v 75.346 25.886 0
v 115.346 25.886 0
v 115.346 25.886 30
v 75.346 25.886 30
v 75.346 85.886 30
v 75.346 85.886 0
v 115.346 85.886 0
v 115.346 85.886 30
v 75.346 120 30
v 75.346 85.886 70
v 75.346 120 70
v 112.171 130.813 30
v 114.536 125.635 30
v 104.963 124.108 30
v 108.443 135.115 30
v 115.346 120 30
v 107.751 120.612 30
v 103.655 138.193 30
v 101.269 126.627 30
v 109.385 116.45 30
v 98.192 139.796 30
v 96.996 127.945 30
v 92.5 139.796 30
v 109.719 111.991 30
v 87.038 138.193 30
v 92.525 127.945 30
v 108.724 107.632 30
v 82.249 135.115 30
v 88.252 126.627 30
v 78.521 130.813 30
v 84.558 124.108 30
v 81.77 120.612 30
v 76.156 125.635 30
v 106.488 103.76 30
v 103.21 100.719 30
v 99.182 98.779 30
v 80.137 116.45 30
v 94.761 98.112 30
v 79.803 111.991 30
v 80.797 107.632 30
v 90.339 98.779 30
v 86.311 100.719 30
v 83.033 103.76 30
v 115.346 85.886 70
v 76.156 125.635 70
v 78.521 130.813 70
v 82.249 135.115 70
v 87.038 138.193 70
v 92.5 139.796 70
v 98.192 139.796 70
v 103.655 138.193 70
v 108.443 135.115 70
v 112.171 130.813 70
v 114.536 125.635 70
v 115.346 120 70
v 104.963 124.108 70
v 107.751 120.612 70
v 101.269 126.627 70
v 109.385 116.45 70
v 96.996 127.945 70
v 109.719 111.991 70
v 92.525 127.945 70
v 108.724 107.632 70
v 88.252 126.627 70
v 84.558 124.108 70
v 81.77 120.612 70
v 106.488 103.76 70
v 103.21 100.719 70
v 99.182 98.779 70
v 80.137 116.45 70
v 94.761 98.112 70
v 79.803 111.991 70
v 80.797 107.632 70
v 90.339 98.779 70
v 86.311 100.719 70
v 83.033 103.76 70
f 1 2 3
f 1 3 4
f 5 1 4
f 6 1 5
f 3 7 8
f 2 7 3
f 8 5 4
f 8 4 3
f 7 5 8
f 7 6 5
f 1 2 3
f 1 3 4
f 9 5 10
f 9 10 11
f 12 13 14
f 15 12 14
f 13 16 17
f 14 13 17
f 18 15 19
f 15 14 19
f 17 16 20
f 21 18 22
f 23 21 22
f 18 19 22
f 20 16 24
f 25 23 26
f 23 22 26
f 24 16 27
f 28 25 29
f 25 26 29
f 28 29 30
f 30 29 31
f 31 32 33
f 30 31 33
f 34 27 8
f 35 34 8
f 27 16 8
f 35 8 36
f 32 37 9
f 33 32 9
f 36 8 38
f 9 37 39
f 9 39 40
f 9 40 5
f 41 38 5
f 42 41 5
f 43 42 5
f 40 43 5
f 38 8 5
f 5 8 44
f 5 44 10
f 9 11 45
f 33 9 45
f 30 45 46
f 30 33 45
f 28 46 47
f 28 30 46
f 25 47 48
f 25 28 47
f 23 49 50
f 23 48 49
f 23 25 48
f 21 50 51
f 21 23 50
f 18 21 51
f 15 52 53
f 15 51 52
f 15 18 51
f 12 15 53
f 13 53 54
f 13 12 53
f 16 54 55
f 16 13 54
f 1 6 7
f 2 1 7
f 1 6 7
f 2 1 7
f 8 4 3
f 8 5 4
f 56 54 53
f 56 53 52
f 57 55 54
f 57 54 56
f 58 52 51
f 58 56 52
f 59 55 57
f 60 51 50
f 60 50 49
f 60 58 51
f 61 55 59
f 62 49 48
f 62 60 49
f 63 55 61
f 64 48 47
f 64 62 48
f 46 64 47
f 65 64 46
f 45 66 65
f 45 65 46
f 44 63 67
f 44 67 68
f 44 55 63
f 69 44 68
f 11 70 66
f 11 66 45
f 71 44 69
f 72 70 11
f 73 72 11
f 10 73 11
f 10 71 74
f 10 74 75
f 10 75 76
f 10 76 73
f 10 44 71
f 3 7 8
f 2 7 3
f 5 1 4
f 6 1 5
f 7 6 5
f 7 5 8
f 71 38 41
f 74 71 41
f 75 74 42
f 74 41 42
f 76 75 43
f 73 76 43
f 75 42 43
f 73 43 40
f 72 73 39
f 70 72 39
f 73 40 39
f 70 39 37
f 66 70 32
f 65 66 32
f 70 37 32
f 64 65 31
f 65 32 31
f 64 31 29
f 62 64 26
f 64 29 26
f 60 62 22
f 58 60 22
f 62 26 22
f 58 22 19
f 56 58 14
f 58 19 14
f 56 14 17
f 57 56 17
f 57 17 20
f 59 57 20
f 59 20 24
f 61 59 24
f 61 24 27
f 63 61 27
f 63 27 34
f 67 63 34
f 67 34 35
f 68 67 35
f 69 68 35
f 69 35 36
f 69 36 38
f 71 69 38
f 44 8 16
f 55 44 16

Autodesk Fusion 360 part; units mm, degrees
sketch "Sketch1" plane through (0, 0, 0) normal (0, 0, 1) x (1, 0, 0) in component "Tamper"
  line L0 (75.3462, 85.8858) -> (115.3462, 85.8858)
  line L1 (115.3462, 85.8858) -> (115.3462, 25.8858)
  line L2 (115.3462, 25.8858) -> (75.3462, 25.8858)
  line L3 (75.3462, 25.8858) -> (75.3462, 85.8858)
  dimension "d1" = 60
  dimension "d2" = 40
extrude "Extrude1" add sketch "Sketch1" along normal blind 30 makes body 1 in component "Tamper"
sketch "Sketch2" plane through (0, 0, 30) normal (0, 0, 1) x (-1, 0, 0) in component "Tamper"
  line L0 (-75.3462, -25.8858) -> (-115.3462, -25.8858)
  line L1 (-115.3462, -25.8858) -> (-115.3462, -85.8858)
  line L2 (-115.3462, -85.8858) -> (-75.3462, -85.8858)
  line L3 (-75.3462, -85.8858) -> (-75.3462, -25.8858)
  line L4 (-75.3462, -85.8858) -> (-75.3462, -120)
  line L5 (-115.3462, -85.8858) -> (-115.3462, -120)
  arc A0 (-115.3462, -120) -> (-75.3462, -120) centre (-95.3462, -120) ccw
extrude "Extrude2" add sketch "Sketch2" along normal blind 20 contours L2 L4 L5 A0 bodies 1 in component "Tamper"
hole "Hole1" at (94.7606, 113.1123, 50) direction (0, 0, -1) diameter 30 depth 20 tip angle 118 bodies 1 in component "Tamper"
extrude "Extrude3" add sketch "Sketch1" along normal blind 30 separate body makes body 2 in component "Tamper"
extrude "Extrude4" add 1 faces at (95.151, 89.9613, 50) along direction (0, 0, 1) blind 20 on bodies 1 bodies 1 in component "Tamper"
component "Tamper" placed x (1, 0, 0) y (0, 1, 0) z (0, 0, 1) at (0, 0, 0)
